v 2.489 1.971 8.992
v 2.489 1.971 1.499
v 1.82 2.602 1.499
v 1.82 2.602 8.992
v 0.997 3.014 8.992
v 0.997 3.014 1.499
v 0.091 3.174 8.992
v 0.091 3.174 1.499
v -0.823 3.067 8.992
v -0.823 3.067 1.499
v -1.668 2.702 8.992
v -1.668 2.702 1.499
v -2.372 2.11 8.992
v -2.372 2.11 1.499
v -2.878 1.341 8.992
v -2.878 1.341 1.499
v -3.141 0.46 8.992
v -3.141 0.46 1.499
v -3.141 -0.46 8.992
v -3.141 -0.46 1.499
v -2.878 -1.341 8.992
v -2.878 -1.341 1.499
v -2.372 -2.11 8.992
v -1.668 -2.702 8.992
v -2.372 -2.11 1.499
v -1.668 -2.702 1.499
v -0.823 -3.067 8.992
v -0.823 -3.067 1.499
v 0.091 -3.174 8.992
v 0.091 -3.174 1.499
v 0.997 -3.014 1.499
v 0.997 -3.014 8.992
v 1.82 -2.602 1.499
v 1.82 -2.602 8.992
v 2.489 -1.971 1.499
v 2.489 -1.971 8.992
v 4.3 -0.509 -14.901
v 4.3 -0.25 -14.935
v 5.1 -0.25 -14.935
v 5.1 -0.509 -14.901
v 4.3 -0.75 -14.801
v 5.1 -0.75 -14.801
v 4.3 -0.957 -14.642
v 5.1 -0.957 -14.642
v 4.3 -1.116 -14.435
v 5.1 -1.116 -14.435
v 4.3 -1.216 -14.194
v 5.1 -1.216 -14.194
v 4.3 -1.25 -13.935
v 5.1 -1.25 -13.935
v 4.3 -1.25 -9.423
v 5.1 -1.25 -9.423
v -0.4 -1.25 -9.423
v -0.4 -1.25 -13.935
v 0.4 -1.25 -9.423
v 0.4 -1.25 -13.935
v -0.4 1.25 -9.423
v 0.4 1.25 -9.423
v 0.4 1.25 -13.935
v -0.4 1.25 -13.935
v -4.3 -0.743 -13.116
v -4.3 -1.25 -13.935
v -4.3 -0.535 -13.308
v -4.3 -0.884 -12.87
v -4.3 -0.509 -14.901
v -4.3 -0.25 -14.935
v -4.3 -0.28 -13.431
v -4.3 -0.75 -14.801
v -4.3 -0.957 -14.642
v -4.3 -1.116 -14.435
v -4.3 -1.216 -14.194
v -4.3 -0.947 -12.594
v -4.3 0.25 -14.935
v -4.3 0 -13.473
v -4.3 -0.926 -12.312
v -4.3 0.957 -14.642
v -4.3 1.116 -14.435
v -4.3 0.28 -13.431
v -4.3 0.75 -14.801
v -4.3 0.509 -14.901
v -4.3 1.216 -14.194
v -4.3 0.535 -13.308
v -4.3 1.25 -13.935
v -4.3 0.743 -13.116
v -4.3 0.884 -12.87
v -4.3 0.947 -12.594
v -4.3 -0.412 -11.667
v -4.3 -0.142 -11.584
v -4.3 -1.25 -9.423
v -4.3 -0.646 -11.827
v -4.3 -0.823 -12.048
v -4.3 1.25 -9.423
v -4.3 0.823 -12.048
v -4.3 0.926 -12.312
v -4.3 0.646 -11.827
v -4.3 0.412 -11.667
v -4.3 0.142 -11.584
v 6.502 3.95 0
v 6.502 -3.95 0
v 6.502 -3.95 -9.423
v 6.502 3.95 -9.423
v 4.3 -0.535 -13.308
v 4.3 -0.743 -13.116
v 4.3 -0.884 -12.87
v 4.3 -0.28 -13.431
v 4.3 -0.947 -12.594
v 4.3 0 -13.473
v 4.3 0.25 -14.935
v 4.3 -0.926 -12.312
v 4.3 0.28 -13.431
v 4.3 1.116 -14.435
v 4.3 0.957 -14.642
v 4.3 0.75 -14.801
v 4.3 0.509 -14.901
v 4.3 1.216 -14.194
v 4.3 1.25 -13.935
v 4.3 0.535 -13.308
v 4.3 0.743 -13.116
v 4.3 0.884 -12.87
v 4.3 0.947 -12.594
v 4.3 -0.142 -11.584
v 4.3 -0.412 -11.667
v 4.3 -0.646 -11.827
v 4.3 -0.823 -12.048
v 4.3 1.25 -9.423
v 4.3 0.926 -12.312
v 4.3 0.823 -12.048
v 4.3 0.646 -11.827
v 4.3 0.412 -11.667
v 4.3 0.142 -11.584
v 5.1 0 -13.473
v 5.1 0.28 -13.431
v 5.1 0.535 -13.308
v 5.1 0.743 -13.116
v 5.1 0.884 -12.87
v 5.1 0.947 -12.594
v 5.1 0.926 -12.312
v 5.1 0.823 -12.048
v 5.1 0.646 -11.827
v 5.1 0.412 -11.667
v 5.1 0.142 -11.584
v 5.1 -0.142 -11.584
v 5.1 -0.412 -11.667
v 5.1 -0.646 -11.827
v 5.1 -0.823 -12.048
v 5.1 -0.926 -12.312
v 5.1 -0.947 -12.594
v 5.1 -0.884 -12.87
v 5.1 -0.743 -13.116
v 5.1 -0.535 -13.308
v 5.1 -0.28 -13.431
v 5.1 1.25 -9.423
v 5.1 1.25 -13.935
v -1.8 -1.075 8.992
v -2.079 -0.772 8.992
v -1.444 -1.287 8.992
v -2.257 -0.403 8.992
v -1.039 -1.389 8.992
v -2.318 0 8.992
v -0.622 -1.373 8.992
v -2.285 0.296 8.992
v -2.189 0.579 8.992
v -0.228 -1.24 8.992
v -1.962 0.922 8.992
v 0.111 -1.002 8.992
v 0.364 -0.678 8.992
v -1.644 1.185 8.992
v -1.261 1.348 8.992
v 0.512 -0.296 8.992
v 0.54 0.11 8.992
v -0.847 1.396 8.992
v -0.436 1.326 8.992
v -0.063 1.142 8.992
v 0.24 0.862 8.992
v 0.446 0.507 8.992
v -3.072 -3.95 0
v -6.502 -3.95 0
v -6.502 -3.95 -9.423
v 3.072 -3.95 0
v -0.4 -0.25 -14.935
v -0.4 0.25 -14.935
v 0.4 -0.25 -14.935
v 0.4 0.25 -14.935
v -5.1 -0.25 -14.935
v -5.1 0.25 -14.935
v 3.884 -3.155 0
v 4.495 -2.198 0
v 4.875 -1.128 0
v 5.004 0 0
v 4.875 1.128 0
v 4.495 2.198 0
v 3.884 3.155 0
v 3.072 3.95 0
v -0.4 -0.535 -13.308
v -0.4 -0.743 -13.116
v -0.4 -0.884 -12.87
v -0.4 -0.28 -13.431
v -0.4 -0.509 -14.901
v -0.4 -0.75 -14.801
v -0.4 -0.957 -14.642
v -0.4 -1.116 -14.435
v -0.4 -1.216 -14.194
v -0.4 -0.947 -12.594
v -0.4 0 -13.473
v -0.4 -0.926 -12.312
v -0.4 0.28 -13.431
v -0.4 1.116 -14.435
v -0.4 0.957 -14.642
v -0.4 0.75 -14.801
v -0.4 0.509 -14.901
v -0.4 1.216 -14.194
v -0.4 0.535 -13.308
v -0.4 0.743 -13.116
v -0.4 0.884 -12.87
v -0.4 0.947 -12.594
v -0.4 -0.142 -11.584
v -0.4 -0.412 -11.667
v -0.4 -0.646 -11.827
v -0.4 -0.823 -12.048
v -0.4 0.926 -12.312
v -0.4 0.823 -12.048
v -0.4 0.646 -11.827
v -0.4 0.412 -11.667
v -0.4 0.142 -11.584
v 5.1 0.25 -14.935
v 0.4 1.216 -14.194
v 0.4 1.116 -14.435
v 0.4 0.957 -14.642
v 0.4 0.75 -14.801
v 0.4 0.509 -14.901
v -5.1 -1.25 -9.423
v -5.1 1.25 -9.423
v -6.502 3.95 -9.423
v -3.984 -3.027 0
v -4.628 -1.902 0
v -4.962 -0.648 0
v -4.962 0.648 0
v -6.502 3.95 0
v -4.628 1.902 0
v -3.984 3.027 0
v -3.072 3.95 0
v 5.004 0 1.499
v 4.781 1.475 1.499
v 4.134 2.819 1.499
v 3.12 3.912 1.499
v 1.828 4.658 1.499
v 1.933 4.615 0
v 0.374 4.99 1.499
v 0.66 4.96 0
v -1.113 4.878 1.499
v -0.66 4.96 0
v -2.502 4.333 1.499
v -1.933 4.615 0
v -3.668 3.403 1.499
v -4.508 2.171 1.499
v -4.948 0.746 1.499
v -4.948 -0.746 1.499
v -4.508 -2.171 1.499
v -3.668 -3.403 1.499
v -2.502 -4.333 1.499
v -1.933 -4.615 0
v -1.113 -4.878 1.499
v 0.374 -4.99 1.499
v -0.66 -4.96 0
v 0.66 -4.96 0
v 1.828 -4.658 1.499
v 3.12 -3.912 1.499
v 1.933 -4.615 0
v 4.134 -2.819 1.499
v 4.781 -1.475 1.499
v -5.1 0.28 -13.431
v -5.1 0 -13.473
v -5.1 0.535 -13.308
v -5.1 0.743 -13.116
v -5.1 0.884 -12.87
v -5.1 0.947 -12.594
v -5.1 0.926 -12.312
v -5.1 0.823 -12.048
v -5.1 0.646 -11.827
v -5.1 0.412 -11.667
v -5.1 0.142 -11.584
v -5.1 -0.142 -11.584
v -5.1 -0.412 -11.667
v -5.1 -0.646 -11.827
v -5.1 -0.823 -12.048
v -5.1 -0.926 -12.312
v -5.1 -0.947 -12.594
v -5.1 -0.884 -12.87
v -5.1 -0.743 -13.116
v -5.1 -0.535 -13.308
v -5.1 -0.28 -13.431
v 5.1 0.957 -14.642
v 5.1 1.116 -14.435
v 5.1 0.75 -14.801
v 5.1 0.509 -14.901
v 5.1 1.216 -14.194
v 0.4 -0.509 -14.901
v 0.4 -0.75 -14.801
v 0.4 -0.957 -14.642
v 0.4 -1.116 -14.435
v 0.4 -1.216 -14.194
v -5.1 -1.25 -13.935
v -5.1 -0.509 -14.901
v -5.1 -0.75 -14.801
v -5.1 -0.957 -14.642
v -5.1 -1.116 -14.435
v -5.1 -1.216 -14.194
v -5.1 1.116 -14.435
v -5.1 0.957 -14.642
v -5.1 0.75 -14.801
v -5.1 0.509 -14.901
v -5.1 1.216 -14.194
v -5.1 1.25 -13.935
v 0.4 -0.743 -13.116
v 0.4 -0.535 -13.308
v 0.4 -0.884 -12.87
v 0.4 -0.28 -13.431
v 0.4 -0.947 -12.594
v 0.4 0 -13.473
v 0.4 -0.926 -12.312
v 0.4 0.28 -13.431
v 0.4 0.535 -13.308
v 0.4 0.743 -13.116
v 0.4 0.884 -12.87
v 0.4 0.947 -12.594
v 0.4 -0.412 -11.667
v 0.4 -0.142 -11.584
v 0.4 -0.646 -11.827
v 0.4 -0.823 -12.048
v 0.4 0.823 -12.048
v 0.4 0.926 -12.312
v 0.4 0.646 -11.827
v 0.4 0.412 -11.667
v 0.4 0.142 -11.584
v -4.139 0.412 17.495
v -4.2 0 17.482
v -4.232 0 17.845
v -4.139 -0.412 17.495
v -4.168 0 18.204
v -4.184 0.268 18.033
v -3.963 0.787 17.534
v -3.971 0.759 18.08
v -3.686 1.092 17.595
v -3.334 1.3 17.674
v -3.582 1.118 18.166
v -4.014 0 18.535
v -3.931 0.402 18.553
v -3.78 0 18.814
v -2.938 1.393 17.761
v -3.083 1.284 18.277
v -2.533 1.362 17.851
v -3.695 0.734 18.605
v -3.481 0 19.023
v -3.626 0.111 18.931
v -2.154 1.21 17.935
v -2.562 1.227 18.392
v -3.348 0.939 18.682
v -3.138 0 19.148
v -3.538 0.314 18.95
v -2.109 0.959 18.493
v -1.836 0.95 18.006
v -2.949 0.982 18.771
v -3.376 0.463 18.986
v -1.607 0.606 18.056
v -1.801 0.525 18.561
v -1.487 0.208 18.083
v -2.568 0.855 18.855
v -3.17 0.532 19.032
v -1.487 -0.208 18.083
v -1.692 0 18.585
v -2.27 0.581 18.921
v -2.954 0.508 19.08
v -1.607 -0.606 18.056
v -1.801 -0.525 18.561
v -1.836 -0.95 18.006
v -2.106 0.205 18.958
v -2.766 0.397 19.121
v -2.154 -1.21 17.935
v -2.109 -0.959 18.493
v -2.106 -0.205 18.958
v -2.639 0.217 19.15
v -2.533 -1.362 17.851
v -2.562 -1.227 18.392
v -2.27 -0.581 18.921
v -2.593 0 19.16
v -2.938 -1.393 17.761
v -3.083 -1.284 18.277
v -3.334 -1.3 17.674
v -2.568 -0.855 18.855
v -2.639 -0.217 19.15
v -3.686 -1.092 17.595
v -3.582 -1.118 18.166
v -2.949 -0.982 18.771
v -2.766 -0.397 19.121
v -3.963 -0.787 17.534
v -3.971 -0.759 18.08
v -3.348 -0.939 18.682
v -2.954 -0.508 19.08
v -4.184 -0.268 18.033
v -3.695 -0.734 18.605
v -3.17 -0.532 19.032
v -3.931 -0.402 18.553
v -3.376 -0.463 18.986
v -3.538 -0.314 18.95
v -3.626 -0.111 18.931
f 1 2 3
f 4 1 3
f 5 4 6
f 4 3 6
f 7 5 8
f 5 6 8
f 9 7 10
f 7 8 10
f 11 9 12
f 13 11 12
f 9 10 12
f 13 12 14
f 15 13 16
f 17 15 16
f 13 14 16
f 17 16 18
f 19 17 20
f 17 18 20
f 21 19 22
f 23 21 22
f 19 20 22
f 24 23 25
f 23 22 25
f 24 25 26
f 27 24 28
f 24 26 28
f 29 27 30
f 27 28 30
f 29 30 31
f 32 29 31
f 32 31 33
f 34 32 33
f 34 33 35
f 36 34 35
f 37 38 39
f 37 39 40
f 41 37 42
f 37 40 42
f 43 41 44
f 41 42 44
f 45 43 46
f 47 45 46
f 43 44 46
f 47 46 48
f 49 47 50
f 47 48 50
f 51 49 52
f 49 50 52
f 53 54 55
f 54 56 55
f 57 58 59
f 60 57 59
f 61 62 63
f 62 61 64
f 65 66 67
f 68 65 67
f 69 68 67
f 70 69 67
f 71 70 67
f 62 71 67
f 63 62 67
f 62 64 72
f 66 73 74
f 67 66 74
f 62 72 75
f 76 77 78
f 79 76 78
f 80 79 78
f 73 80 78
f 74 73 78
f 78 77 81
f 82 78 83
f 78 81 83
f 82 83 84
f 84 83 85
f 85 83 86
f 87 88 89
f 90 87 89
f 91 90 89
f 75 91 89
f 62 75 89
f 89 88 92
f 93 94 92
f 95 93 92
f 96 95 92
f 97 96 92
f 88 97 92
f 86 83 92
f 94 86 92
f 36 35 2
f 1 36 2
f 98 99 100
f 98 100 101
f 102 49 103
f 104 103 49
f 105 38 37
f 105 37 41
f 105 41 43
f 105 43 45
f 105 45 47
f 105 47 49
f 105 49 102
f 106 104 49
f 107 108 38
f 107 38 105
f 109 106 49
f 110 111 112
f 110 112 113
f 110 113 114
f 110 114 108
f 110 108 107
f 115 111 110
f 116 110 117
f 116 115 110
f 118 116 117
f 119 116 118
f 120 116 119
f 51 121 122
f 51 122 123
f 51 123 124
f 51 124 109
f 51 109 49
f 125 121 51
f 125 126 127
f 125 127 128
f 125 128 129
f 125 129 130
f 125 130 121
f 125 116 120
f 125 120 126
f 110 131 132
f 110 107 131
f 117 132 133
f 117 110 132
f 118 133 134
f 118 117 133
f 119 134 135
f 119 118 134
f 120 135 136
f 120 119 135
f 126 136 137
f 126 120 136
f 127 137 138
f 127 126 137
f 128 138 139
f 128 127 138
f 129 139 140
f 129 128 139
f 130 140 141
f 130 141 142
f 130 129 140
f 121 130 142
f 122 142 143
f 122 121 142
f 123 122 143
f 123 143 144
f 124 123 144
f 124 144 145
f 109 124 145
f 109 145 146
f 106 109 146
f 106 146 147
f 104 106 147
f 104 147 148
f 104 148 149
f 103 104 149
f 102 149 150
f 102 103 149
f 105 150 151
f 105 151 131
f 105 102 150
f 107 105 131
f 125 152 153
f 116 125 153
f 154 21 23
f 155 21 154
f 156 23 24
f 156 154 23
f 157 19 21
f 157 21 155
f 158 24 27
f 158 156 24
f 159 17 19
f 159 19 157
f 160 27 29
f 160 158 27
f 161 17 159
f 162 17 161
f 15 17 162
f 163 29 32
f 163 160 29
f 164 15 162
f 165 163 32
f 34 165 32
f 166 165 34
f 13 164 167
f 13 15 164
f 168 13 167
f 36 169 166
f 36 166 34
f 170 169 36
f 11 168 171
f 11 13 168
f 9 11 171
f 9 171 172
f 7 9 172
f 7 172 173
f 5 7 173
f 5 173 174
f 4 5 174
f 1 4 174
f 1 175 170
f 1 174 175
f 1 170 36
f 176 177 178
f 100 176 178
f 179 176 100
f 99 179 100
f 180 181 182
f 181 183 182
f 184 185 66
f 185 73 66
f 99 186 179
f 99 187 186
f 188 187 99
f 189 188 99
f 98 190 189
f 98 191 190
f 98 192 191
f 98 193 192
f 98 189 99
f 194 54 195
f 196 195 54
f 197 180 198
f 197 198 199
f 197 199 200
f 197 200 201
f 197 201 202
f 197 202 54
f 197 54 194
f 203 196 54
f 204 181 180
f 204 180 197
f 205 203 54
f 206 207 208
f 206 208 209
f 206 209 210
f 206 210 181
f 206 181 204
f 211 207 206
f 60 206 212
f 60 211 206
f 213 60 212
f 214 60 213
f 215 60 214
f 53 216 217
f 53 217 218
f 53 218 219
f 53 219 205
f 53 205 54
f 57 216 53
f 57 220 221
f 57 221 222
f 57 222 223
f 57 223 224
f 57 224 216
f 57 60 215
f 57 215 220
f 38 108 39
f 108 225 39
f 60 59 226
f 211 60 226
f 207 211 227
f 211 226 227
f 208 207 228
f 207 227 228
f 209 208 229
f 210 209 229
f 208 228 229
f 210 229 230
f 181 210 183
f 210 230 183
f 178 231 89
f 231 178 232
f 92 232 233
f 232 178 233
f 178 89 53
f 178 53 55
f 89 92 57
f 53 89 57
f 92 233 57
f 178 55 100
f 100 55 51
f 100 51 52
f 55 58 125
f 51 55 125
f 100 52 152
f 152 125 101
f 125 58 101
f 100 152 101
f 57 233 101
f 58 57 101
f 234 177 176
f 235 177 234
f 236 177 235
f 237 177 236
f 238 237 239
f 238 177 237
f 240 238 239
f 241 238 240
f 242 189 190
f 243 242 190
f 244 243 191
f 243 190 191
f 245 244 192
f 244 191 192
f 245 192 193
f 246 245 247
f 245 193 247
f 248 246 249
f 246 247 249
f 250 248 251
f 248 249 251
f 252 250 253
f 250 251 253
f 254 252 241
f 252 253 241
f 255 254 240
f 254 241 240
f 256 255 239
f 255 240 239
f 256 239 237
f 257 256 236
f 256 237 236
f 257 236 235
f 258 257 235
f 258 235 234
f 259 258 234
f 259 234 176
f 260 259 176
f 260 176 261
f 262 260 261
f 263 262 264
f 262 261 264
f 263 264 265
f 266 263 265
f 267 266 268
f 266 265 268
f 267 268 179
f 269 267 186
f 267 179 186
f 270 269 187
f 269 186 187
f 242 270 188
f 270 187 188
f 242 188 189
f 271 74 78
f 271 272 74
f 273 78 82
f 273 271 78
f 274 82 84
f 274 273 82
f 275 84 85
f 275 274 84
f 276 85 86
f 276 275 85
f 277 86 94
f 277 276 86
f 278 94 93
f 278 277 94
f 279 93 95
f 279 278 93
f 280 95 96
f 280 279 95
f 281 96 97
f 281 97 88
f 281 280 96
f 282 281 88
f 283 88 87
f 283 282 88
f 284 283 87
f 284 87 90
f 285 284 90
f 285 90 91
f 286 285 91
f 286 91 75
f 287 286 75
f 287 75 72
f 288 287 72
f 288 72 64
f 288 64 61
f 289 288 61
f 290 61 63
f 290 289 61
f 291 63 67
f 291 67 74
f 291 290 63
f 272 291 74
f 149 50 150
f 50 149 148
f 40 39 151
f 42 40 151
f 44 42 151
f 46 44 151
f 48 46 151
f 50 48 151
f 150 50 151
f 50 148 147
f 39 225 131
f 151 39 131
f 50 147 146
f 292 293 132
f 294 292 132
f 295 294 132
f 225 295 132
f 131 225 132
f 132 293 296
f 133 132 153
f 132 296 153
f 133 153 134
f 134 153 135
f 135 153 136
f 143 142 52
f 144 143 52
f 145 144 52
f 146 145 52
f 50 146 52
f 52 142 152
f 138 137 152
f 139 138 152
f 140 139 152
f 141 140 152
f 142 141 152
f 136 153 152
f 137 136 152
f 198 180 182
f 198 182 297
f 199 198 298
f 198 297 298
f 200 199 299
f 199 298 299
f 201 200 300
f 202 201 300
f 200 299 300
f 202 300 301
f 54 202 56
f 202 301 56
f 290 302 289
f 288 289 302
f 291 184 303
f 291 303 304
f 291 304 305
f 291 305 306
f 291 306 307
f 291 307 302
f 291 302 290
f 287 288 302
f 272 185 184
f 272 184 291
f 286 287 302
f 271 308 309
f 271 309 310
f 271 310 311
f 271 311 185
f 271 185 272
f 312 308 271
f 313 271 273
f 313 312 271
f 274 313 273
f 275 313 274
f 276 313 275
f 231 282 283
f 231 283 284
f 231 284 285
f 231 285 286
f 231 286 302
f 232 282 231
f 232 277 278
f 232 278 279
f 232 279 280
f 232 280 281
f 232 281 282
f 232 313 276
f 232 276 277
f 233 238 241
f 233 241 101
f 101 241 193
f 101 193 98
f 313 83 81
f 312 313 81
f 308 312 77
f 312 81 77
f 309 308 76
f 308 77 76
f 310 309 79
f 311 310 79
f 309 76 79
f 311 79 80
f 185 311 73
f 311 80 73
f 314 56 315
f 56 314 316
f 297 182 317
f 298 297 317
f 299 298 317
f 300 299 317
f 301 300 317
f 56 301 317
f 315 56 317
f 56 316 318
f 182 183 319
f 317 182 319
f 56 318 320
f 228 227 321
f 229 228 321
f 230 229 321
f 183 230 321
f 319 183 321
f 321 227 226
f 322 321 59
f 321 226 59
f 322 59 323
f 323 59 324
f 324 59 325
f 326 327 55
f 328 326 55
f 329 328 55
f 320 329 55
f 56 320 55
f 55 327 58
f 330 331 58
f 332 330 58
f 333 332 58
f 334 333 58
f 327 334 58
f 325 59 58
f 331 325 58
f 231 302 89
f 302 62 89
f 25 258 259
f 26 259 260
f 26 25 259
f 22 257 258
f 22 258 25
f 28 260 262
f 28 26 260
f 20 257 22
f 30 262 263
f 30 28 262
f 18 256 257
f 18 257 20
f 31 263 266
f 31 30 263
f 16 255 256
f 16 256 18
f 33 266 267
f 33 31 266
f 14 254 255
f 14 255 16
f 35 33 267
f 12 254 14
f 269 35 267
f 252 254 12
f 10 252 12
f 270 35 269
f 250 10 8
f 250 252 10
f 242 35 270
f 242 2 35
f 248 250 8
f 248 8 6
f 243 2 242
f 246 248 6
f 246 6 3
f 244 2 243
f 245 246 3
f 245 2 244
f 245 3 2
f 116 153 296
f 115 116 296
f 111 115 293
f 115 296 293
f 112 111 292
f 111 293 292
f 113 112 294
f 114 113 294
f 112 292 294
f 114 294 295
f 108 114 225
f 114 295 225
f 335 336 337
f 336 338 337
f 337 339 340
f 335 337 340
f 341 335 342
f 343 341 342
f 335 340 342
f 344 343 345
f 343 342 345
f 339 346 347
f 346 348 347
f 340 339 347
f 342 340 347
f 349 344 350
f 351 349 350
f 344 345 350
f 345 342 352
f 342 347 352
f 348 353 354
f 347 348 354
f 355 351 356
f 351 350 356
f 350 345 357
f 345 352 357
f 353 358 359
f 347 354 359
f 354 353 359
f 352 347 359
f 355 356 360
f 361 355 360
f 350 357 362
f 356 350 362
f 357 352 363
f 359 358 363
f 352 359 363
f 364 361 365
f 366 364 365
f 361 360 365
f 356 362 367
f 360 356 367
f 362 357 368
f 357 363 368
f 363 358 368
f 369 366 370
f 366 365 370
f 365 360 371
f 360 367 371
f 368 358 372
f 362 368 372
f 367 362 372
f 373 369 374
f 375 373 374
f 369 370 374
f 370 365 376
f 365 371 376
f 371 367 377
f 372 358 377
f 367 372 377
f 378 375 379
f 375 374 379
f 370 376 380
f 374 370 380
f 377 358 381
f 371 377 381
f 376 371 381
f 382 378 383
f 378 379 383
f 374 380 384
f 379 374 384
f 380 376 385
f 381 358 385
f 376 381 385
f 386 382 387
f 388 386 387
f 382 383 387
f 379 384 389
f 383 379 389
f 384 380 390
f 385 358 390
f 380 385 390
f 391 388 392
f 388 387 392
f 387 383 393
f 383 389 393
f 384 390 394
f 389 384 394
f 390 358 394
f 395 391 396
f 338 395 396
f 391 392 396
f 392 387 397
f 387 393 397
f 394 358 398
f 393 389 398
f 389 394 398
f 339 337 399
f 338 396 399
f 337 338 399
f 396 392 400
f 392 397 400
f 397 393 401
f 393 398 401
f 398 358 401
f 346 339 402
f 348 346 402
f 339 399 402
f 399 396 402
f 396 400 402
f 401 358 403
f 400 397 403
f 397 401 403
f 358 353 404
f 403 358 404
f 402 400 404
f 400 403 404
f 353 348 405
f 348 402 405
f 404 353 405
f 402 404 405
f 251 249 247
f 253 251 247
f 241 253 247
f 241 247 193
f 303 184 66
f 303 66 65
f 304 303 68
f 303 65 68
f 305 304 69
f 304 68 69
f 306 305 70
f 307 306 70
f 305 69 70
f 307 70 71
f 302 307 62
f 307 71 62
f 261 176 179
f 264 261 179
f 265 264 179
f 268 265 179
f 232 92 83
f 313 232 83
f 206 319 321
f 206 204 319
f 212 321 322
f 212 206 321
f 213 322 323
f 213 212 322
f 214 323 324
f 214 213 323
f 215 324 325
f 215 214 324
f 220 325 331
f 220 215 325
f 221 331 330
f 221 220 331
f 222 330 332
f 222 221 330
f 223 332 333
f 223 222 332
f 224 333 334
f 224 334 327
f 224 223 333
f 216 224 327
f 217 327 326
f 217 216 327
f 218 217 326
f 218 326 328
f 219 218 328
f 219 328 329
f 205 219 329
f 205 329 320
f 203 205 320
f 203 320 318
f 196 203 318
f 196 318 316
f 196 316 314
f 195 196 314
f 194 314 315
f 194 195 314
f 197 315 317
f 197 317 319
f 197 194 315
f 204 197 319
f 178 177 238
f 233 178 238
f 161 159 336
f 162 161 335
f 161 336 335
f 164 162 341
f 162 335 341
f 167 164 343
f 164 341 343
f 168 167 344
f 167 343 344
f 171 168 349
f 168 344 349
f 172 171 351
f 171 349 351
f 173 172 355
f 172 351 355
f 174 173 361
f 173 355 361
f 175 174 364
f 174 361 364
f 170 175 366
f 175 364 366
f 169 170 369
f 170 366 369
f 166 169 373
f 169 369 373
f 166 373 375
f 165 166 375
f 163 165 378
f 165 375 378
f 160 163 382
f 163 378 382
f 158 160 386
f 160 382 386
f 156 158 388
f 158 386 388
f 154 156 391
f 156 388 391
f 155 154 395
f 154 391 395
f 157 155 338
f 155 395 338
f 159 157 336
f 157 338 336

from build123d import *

# Parameters (mm, degrees)
SKETCH2_W           = 13.0048
SKETCH2_H           = 7.8994
BOSS_EXTRUDE1_DEPTH = 9.4234
BOSS_EXTRUDE2_START = 4.7
SKETCH5_R           = 0.95
BOSS_EXTRUDE2_DEPTH = 0.4
LPATTERN1_COUNT     = 3
LPATTERN1_PITCH     = 4.7
SKETCH6_R           = 5.0038
BOSS_EXTRUDE3_DEPTH = 1.4986
BOSS_EXTRUDE5_DEPTH = 7.493


with BuildPart() as part:
    # Sketch2 → Boss-Extrude1 (new body)
    with BuildSketch(Plane.XY):
        Rectangle(SKETCH2_W, SKETCH2_H)
    extrude(amount=-BOSS_EXTRUDE1_DEPTH)

    # Sketch5 → Boss-Extrude2 (add, symmetric)
    with BuildSketch(Plane(origin=(0, 0, 0), x_dir=(0, 0, -1), z_dir=(1, 0, 0)).offset(BOSS_EXTRUDE2_START)):
        with BuildLine():
            ThreePointArc((13.9352, 1.25), (14.642306781, 0.957106781), (14.9352, 0.25))
            Line((14.9352, 0.25), (14.9352, -0.25))
            ThreePointArc((14.9352, -0.25), (14.642306781, -0.957106781), (13.9352, -1.25))
            Line((13.9352, -1.25), (9.4234, -1.25))
            Line((9.4234, -1.25), (9.4234, 1.25))
            Line((9.4234, 1.25), (13.9352, 1.25))
        make_face()
        with Locations((12.5234, 0)):
            Circle(SKETCH5_R, mode=Mode.SUBTRACT)
    boss_extrude2 = extrude(amount=BOSS_EXTRUDE2_DEPTH, both=True)

    # LPattern1: Boss-Extrude2 ×3
    with Locations(*[(-i * LPATTERN1_PITCH, 0, 0) for i in range(1, LPATTERN1_COUNT)]):
        add(boss_extrude2)

    # Sketch6 → Boss-Extrude3 (add)
    with BuildSketch(Plane.XY):
        Circle(SKETCH6_R)
    extrude(amount=BOSS_EXTRUDE3_DEPTH)

    # Sketch7 → Boss-Extrude5 (add)
    with BuildSketch(Plane.XY.offset(1.4986)):
        with BuildLine():
            Line((2.4892, -1.970915615), (2.4892, 1.970915615))
            ThreePointArc((2.4892, 1.970915615), (-3.175, 0), (2.4892, -1.970915615))
        make_face()
    extrude(amount=BOSS_EXTRUDE5_DEPTH)

    # Sketch8 → Revolve1 (revolve)
    with BuildSketch(Plane(origin=(0, 0, 0), x_dir=(1, 0, 0), z_dir=(0, 1, 0))):
        with BuildLine():
            Line((-3.138374402, -19.147892103), (0, -4.9916))
            Line((0, -4.9916), (-1.363885522, -4.689233859))
            Line((-1.363885522, -4.689233859), (-4.199893783, -17.481640441))
            ThreePointArc((-4.199893783, -17.481640441), (-4.014226111, -18.534614134), (-3.138374402, -19.147892103))
        make_face()
    revolve(axis=Axis((-3.138374402, 0, 19.147892103), (0.216439614, 0, -0.976296007)))


solid = part.part
